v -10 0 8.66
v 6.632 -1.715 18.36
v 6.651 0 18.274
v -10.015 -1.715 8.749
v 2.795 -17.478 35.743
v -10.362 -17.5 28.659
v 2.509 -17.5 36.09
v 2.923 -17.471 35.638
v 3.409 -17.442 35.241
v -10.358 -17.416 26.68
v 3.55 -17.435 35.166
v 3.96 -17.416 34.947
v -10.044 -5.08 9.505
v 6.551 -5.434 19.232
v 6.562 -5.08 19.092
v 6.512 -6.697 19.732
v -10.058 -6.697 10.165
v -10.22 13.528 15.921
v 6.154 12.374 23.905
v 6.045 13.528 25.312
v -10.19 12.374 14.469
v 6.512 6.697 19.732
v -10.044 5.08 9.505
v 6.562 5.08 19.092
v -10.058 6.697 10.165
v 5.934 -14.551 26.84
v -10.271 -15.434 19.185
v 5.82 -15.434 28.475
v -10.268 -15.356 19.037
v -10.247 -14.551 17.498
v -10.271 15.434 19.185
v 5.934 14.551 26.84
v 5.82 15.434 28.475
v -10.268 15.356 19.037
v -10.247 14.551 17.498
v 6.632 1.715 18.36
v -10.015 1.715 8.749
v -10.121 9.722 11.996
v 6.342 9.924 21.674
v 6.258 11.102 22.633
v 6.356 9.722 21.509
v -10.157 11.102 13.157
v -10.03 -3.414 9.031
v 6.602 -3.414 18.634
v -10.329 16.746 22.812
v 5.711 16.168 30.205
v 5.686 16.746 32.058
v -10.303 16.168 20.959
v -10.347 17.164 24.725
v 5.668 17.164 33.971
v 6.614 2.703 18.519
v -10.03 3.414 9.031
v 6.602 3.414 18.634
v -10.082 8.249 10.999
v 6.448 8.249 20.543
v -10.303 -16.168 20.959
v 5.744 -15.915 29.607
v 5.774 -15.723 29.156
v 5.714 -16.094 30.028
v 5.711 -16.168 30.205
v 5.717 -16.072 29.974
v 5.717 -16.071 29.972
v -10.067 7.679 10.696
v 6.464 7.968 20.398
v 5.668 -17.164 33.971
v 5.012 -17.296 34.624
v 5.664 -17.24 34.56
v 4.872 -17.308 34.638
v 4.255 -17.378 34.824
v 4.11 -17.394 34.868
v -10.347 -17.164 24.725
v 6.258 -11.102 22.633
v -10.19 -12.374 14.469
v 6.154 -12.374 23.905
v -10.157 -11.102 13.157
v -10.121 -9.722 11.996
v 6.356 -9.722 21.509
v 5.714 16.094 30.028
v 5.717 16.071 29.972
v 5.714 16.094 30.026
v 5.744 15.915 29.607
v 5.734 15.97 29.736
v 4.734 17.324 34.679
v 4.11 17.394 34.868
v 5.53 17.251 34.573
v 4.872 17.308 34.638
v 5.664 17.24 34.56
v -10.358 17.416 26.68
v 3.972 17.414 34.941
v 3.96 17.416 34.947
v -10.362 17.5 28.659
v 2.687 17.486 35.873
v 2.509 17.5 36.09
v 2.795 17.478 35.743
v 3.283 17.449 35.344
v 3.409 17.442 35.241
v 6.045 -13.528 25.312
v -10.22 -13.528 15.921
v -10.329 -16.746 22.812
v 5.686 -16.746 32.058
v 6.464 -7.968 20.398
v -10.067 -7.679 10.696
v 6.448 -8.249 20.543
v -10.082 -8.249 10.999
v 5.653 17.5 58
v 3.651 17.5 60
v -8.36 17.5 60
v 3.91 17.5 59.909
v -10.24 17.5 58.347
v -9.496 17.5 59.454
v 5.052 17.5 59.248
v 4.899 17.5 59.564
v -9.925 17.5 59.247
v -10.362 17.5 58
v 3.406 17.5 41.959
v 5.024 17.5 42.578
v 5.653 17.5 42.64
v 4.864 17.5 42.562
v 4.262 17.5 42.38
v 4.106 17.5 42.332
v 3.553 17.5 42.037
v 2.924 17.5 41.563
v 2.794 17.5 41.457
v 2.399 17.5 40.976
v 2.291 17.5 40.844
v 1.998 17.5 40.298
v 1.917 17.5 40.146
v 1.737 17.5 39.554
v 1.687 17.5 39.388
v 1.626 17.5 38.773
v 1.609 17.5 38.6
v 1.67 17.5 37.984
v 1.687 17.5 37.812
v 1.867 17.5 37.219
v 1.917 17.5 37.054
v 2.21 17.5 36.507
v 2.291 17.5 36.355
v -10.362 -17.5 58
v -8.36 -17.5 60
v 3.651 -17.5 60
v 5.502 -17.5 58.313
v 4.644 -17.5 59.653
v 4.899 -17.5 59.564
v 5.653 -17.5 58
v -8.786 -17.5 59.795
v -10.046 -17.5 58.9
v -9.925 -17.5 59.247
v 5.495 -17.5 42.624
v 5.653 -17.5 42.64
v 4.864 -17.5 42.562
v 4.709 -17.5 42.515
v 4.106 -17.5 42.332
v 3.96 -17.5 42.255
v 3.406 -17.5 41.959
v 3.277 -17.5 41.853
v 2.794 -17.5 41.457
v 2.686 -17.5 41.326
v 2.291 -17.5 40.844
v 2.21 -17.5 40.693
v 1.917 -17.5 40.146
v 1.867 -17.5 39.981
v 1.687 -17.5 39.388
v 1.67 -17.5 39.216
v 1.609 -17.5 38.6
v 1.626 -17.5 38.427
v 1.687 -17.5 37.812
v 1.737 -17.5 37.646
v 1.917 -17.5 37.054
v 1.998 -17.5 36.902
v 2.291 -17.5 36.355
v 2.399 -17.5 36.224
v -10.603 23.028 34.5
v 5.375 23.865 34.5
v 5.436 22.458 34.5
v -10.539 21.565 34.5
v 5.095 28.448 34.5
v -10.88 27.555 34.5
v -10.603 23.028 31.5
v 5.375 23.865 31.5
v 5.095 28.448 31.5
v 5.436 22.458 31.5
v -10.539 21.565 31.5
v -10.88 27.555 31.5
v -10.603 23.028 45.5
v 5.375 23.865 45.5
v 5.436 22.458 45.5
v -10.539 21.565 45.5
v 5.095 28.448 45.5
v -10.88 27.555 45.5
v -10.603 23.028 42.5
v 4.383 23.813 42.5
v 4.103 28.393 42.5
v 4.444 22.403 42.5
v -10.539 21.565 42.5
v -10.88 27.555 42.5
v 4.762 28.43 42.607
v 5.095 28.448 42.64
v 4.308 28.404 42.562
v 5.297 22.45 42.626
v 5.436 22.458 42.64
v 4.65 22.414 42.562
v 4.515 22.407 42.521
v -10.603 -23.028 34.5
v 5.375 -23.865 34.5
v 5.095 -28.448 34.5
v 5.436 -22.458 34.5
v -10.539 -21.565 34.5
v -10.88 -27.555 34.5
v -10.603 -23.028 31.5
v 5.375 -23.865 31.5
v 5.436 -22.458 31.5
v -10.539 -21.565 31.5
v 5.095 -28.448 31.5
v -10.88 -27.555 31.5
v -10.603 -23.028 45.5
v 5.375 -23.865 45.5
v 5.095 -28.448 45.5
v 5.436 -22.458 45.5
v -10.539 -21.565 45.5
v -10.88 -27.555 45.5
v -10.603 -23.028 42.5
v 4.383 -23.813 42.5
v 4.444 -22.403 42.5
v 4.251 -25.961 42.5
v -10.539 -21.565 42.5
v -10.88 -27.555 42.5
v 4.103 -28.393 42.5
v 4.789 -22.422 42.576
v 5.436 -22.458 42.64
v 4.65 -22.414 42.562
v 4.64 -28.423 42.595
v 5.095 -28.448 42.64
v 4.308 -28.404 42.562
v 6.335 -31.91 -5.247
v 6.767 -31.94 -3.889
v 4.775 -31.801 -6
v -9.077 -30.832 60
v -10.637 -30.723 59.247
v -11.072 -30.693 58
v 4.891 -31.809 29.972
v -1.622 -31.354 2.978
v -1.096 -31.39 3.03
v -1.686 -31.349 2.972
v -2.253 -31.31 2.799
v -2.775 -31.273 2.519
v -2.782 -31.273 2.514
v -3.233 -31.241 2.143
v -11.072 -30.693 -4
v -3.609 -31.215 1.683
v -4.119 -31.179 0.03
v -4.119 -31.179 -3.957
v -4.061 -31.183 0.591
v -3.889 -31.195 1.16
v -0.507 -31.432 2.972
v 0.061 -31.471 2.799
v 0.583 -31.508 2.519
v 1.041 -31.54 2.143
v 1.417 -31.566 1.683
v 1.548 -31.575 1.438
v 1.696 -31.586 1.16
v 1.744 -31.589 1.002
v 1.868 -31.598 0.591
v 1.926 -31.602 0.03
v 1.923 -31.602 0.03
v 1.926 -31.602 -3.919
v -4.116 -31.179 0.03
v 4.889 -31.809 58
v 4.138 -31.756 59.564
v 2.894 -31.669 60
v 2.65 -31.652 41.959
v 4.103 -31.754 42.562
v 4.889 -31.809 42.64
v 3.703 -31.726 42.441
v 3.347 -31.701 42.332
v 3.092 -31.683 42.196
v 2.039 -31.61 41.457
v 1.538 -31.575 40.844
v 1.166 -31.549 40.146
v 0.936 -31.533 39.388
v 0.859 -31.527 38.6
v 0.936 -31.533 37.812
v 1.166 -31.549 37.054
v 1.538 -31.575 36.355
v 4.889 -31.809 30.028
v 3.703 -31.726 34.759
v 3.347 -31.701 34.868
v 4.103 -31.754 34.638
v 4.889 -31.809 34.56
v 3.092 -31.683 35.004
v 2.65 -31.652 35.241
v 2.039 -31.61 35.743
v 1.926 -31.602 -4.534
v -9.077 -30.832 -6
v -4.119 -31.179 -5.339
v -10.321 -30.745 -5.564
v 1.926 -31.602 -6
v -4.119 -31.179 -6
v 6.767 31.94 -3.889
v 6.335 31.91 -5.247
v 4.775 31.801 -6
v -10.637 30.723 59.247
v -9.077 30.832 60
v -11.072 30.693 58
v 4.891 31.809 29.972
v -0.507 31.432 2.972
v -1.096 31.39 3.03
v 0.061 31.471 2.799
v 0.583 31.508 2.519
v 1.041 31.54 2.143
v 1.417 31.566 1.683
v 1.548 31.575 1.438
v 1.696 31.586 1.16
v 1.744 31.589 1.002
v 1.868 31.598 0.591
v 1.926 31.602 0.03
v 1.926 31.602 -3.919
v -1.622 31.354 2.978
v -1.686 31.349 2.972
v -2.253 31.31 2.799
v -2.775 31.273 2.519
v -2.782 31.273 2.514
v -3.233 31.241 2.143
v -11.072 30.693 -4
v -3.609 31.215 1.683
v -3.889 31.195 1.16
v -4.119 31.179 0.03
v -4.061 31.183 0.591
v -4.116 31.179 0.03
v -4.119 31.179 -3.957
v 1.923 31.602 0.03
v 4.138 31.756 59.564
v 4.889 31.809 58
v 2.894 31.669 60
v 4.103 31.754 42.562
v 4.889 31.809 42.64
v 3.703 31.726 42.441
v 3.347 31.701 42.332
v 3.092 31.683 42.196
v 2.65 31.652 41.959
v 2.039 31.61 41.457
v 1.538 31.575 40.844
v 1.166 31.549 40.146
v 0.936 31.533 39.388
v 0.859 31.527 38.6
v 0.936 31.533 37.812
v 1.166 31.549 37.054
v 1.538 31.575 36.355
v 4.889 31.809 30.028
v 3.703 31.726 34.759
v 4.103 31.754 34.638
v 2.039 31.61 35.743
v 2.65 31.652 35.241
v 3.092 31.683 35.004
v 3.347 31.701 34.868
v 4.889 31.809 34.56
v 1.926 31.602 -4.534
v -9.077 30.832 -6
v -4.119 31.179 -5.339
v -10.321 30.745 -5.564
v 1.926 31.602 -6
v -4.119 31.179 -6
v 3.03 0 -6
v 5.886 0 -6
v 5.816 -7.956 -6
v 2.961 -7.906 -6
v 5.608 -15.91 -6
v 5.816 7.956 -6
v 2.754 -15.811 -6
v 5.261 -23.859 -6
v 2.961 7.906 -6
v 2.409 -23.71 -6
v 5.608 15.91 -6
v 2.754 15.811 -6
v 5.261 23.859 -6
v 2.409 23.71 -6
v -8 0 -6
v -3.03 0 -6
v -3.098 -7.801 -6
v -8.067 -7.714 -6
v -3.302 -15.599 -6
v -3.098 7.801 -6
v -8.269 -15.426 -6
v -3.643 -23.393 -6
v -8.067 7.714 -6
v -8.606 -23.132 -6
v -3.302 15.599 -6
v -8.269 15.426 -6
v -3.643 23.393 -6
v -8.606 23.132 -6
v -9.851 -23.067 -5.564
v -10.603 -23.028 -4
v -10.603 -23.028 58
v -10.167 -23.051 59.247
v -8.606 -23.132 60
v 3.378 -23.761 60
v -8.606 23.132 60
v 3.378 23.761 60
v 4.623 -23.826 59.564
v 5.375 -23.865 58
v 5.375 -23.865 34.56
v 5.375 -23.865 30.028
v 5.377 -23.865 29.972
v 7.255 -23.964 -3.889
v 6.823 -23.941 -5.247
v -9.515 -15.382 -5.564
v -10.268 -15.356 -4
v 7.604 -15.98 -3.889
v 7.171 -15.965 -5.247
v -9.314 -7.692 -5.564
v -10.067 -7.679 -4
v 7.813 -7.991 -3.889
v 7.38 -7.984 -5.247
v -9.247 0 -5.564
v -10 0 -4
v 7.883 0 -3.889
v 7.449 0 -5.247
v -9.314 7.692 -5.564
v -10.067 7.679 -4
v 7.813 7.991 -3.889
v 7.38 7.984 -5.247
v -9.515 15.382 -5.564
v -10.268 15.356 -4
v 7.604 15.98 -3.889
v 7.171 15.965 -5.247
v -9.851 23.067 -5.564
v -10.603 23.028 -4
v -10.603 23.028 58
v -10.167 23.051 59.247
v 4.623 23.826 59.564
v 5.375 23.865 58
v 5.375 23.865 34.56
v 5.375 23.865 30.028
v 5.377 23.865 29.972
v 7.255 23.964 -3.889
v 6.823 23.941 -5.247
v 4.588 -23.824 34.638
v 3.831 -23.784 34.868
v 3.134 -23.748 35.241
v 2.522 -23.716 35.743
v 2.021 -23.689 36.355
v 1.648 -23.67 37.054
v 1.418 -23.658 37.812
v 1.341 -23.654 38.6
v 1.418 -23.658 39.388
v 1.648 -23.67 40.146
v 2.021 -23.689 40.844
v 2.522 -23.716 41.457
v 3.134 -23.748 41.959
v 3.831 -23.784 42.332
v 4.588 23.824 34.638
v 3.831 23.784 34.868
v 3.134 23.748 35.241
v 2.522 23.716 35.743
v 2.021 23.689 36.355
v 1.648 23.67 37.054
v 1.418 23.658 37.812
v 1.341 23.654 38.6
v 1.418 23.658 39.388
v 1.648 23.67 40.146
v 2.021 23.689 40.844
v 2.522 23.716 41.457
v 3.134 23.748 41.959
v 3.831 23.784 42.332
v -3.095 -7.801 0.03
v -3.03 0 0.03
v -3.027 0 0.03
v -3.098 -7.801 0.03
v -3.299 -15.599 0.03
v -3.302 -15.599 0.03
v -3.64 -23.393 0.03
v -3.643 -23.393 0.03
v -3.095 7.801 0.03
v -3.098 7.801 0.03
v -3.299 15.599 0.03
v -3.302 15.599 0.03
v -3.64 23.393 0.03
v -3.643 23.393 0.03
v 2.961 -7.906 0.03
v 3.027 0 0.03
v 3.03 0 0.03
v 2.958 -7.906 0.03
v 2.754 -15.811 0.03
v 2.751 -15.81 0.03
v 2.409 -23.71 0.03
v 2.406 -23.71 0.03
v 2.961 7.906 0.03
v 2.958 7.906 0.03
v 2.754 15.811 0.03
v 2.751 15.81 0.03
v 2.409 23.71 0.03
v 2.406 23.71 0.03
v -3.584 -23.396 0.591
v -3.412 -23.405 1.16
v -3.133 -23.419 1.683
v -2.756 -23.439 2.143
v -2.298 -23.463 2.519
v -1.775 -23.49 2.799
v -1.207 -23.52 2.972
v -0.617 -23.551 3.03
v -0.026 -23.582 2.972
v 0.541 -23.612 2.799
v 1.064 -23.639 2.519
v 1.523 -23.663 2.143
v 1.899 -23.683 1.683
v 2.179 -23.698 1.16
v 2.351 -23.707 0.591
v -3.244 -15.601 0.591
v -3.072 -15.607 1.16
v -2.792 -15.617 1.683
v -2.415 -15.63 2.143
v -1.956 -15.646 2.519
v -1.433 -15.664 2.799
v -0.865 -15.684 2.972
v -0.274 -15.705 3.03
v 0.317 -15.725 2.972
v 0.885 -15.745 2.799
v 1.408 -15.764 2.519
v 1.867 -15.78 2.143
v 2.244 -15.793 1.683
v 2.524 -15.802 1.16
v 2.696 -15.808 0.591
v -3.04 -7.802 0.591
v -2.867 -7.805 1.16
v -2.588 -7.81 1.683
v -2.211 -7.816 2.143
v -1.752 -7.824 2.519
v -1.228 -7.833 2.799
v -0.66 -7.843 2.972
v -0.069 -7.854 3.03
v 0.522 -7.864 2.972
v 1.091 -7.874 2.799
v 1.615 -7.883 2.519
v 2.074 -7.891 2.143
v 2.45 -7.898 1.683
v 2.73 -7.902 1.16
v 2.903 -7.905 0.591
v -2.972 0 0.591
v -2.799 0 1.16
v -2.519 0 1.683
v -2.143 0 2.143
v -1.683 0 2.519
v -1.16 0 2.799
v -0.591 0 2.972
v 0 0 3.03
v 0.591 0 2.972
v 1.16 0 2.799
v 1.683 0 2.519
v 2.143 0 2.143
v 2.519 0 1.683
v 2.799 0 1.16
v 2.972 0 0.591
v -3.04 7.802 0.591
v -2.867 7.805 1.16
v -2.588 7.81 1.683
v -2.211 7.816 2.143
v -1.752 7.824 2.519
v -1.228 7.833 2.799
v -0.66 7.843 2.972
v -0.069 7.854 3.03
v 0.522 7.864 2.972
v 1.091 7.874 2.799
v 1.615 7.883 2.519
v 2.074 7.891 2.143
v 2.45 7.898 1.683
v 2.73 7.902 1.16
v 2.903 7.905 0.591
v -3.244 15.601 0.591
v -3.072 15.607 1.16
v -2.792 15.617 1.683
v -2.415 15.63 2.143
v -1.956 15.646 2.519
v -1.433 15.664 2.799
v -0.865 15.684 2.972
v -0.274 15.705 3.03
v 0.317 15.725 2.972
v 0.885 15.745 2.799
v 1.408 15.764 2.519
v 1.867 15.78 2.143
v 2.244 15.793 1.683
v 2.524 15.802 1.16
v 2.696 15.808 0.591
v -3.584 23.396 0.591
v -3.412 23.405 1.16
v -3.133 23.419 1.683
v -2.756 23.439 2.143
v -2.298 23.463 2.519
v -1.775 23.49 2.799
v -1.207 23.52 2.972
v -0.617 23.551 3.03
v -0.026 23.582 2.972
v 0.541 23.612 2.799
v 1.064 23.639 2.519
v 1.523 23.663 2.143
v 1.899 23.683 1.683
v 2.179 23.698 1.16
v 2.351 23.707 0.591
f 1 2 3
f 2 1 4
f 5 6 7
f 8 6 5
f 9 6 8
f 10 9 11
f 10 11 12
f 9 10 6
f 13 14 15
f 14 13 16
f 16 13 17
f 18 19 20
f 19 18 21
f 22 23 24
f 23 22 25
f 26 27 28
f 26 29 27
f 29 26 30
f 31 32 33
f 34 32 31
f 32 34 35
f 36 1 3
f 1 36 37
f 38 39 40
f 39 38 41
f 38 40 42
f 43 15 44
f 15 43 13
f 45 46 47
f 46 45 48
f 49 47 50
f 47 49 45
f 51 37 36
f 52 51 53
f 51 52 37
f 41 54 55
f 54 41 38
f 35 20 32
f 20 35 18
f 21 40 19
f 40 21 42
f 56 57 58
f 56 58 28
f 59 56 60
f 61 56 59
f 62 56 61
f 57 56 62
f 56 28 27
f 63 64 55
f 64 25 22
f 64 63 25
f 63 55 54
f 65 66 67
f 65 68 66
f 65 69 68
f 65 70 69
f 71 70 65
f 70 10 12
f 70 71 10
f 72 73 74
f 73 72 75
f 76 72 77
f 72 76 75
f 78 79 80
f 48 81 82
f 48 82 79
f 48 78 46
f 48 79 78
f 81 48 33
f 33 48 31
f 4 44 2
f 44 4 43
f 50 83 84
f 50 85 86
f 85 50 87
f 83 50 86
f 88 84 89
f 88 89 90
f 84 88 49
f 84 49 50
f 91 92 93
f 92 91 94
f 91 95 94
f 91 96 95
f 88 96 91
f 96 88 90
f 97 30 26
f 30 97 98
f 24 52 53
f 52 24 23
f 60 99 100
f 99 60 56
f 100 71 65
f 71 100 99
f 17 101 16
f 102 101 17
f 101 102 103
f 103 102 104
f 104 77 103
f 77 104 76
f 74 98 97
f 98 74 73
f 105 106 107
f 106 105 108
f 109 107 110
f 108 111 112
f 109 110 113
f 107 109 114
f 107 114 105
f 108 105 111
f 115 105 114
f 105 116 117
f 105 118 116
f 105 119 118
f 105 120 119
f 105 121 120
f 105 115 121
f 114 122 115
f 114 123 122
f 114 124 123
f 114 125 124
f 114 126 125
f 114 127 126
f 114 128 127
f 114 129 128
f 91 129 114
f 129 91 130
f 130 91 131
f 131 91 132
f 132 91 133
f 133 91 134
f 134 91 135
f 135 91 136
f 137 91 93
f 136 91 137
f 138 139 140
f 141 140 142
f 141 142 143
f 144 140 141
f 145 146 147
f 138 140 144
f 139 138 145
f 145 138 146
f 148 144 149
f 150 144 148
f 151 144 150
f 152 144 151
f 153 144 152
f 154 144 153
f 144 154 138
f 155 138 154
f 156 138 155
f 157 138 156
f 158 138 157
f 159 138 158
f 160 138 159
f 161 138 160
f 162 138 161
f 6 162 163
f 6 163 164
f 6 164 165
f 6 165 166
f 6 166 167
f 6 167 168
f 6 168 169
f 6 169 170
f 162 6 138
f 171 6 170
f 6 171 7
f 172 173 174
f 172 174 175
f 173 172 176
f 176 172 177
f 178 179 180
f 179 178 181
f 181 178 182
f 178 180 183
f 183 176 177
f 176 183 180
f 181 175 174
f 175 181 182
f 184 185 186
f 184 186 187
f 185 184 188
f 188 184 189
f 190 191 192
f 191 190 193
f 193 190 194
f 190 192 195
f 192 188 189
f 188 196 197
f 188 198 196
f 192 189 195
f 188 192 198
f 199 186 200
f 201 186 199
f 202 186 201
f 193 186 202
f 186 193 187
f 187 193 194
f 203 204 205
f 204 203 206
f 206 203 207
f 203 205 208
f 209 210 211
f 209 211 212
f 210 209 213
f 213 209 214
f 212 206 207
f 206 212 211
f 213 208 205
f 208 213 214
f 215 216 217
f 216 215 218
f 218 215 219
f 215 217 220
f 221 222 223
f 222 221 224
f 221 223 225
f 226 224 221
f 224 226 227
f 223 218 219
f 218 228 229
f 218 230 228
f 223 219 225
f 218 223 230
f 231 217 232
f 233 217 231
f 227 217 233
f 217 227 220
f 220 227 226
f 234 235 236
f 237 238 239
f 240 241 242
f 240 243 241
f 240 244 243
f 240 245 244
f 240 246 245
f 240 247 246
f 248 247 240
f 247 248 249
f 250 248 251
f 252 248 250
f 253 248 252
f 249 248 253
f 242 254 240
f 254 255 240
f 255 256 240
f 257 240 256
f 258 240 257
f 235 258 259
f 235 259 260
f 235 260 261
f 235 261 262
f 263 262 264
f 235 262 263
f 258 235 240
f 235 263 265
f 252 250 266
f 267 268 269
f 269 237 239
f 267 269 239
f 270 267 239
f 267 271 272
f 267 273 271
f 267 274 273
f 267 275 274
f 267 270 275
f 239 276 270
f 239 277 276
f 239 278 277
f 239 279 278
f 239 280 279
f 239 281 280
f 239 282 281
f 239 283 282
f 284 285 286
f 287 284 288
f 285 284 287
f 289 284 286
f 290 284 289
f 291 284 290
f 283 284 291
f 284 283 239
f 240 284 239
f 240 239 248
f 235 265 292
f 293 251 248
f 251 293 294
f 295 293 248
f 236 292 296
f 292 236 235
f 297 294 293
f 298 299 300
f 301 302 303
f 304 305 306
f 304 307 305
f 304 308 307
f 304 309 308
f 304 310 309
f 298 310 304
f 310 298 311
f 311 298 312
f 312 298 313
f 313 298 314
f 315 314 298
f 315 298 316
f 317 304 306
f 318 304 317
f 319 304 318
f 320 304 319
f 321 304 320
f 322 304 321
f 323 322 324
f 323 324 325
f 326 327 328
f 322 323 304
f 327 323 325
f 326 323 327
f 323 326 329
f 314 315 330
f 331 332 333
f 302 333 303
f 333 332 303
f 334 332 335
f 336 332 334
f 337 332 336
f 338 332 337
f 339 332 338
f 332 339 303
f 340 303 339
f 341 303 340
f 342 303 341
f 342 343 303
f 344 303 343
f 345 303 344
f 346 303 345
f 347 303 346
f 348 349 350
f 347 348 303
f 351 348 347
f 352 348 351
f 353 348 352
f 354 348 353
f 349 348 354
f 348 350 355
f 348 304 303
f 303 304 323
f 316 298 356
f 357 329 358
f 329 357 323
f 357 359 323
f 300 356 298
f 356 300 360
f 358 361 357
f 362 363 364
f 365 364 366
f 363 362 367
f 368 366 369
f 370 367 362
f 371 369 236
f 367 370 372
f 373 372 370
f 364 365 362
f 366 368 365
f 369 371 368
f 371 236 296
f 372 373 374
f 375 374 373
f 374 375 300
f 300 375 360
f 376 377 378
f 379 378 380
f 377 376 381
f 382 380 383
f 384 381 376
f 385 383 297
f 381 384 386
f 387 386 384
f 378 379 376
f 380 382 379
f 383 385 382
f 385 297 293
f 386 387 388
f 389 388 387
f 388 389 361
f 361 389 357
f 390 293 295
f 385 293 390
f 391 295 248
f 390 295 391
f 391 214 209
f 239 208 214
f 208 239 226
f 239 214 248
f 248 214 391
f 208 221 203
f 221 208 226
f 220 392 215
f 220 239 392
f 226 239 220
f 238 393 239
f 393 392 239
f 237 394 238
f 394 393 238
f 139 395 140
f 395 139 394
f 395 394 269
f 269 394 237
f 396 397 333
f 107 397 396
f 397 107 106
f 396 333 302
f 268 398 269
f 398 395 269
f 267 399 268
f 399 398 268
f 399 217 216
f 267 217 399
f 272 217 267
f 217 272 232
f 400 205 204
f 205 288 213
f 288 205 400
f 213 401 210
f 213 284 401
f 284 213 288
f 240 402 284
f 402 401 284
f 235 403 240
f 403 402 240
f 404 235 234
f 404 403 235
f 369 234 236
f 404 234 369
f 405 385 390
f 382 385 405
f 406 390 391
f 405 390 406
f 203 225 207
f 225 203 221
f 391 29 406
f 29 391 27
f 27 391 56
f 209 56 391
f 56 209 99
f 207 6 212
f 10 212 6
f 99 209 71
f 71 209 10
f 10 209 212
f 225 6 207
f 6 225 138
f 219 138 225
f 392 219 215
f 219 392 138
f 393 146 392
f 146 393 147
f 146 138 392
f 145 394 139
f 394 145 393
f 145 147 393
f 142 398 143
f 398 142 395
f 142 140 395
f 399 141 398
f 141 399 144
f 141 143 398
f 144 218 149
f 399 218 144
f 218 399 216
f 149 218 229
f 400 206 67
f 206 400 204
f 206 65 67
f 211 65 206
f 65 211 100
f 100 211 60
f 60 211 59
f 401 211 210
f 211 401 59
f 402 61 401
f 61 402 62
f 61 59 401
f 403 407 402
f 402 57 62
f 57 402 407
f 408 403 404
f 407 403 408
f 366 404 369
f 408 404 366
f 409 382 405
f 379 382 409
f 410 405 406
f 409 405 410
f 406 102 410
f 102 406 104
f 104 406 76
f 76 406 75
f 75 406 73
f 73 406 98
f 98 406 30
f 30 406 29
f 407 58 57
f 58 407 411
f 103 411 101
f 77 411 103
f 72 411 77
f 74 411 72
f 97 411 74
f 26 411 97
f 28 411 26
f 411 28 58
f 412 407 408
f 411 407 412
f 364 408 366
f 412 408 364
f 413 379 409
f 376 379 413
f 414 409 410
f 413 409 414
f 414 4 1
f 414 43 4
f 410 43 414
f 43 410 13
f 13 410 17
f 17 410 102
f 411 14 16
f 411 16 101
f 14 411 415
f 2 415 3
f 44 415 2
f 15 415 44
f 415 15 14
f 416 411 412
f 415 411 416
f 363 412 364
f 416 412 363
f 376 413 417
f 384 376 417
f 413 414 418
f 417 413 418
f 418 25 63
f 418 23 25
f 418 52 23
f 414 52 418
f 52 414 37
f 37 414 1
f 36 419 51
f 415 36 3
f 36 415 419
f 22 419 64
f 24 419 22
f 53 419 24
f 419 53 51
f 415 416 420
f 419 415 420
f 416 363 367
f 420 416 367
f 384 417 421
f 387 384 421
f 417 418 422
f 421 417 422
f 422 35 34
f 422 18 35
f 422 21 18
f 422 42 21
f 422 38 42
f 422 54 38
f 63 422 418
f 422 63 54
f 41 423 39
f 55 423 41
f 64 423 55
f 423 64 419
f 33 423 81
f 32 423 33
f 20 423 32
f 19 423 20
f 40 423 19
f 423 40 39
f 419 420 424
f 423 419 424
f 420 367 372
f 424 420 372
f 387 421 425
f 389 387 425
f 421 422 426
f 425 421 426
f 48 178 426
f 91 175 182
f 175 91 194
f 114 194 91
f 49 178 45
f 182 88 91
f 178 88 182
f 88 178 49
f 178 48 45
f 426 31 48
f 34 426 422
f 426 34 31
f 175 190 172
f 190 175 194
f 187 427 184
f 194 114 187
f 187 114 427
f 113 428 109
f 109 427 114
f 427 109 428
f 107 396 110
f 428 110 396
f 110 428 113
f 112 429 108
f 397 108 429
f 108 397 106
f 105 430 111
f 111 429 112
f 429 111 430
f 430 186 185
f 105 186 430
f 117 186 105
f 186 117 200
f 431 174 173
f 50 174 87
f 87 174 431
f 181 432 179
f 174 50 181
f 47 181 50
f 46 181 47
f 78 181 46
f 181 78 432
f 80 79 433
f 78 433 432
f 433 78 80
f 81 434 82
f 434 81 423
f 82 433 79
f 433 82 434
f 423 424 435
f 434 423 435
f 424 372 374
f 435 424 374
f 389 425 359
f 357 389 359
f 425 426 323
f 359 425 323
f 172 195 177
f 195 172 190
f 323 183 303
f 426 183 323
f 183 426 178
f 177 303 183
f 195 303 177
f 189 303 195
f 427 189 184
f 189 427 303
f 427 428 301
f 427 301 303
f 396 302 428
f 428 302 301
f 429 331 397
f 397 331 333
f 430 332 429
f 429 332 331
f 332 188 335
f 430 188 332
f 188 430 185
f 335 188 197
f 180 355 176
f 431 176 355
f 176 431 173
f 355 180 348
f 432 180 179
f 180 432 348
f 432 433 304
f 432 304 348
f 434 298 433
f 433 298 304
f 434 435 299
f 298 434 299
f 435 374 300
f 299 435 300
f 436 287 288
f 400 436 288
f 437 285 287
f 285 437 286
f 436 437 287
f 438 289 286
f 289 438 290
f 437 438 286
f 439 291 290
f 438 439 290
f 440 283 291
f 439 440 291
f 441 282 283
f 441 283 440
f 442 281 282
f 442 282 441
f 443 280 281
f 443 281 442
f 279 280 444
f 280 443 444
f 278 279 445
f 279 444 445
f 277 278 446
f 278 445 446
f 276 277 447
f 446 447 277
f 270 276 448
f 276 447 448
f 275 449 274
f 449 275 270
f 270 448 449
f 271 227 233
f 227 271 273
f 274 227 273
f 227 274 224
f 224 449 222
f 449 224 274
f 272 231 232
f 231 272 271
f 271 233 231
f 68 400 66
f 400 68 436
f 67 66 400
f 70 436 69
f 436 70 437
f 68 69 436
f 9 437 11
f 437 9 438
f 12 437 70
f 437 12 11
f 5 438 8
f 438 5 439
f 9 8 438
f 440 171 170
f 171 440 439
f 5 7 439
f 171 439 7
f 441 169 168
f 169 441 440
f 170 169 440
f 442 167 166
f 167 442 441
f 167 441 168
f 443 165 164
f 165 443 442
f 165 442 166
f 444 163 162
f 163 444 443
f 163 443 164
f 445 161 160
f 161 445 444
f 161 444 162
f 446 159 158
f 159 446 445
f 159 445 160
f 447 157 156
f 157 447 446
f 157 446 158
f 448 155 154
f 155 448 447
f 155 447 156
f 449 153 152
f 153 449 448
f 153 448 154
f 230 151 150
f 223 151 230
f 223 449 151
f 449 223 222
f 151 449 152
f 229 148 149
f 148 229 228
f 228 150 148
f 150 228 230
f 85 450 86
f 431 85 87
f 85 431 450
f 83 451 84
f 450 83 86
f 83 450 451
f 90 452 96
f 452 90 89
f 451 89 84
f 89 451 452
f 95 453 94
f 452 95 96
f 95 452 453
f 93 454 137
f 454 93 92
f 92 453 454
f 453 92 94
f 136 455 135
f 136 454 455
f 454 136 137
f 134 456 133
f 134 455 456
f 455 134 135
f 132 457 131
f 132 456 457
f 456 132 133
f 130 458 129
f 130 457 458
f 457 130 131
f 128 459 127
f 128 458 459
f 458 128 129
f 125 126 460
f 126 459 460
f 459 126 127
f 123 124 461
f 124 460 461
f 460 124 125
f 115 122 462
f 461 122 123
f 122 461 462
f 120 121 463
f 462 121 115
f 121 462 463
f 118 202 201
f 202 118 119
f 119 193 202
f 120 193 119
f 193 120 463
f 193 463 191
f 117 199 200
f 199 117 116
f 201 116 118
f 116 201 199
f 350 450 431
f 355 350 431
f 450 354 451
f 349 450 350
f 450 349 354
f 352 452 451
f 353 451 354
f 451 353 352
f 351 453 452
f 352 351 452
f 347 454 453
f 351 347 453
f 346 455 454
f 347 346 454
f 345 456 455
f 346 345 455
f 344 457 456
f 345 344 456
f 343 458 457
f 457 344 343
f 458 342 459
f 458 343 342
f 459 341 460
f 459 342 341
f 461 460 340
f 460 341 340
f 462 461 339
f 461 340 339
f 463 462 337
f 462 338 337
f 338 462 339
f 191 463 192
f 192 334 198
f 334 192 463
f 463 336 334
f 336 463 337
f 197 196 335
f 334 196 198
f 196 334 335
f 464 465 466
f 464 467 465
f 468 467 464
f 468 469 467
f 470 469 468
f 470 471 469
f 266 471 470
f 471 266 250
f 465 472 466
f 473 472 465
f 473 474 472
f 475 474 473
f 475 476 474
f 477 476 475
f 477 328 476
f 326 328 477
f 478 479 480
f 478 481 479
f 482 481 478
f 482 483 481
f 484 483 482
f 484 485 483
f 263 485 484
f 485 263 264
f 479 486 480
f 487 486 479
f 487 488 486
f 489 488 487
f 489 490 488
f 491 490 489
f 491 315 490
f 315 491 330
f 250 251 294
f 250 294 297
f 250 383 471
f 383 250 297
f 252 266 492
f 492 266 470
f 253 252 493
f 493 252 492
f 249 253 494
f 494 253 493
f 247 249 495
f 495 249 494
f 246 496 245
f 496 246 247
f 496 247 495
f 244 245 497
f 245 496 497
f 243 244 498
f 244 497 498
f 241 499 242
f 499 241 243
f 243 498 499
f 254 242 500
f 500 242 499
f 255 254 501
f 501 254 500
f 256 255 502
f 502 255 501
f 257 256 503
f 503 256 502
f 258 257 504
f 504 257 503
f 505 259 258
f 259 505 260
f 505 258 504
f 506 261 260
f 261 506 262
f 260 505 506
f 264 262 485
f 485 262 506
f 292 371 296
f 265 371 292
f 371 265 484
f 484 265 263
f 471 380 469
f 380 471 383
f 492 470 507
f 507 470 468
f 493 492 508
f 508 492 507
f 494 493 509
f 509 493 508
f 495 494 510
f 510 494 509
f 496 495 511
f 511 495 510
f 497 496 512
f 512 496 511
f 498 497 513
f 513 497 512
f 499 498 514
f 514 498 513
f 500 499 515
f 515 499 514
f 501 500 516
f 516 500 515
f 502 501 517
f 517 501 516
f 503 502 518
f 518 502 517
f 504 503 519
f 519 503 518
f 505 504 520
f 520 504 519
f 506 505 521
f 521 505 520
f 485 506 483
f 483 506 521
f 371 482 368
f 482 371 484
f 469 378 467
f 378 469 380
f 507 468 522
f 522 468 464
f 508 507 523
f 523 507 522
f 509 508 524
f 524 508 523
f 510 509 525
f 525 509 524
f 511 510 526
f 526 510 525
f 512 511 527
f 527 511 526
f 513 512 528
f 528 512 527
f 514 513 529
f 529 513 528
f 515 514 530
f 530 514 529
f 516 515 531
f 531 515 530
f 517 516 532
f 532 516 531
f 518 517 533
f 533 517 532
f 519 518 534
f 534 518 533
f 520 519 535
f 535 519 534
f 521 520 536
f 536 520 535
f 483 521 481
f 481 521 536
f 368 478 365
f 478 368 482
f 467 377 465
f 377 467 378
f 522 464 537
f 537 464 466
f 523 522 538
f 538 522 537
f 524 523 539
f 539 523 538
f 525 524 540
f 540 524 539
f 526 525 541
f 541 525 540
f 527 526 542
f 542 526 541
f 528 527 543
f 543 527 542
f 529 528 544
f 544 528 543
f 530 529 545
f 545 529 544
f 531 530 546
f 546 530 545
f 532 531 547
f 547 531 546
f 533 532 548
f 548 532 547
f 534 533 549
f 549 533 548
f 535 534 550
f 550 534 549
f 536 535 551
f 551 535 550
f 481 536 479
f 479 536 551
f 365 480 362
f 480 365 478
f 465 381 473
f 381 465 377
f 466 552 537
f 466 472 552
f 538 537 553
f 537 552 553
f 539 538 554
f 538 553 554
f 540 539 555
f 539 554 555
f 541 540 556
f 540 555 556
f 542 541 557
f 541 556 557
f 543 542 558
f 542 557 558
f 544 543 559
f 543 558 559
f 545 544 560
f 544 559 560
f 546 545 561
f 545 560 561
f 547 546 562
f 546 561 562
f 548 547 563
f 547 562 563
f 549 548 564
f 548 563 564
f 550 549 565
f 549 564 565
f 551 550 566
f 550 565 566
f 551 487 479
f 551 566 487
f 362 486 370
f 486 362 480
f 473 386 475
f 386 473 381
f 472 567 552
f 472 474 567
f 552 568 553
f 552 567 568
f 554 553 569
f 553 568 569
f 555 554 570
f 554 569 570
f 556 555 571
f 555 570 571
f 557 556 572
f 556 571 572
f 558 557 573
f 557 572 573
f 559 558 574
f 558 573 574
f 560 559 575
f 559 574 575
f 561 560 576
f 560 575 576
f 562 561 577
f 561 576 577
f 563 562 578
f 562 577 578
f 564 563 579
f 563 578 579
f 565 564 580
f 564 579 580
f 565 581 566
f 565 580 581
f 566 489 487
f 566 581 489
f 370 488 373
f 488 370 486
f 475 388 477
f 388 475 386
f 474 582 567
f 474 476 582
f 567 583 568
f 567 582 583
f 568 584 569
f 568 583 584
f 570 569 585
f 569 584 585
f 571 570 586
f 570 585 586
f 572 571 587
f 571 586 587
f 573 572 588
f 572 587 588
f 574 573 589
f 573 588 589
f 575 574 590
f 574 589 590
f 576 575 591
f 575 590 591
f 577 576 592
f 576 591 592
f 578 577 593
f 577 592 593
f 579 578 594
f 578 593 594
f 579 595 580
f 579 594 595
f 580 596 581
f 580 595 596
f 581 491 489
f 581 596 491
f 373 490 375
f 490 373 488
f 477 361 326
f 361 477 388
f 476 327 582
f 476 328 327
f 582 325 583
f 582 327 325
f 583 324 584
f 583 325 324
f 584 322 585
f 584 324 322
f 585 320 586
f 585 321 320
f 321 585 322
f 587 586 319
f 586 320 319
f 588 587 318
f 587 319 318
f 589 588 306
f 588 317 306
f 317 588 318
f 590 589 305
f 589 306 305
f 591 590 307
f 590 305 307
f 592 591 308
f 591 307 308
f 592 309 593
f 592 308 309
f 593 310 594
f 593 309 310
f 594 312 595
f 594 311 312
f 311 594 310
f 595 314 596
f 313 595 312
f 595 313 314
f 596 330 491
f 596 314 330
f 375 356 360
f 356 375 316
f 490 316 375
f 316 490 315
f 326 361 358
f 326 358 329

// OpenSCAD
module wire_tray()
{
    radius=450;
    translate([-radius,0,0])
    rotate([0,0,-10])
    rotate_extrude(angle=20, $fa=1)
    {
        translate([radius, 0])
        {
            $fn=32;
            circle(d=6.06);
            translate([0,-3])
                square(6.06,center=true);
            translate([6,38.6])
                circle(d=8.08);
        }
    }
}

module blob() {
    radius=450;
    translate([-radius,0,0])
    rotate([0,0,-4])
    rotate_extrude(angle=8, $fa=1)
    {
        translate([radius, 0])
        {
            offset(r=2)
            {
                offset(r=-2)
                polygon([
                    [-10,-6],
                    [8,-6],
                    [6,30],
                    [6,60],
                    [-10,60]
                
                ]);
            }
        }
    }
}

module inset() {
    translate([0,0,30])
    rotate([0,90,0])
        cylinder(h=99,d=35, center=true, $fn=64);
    translate([0,0,30+35])
        cube([99,35,70], center=true);    
}

module mounting(angle)
{    
    radius=450;
    translate([-radius,0,0])
    rotate([0,0,angle])
    translate([radius,0,0])
    {
        translate([0,0,33])
            cube([99,6,3], center=true);
        translate([0,0,44])
            cube([99,6,3], center=true);
    }
}

difference(){
    blob();
    wire_tray();
    rotate([0,-30,0])
        inset();
    mounting(3.2);
    mounting(-3.2);
}
